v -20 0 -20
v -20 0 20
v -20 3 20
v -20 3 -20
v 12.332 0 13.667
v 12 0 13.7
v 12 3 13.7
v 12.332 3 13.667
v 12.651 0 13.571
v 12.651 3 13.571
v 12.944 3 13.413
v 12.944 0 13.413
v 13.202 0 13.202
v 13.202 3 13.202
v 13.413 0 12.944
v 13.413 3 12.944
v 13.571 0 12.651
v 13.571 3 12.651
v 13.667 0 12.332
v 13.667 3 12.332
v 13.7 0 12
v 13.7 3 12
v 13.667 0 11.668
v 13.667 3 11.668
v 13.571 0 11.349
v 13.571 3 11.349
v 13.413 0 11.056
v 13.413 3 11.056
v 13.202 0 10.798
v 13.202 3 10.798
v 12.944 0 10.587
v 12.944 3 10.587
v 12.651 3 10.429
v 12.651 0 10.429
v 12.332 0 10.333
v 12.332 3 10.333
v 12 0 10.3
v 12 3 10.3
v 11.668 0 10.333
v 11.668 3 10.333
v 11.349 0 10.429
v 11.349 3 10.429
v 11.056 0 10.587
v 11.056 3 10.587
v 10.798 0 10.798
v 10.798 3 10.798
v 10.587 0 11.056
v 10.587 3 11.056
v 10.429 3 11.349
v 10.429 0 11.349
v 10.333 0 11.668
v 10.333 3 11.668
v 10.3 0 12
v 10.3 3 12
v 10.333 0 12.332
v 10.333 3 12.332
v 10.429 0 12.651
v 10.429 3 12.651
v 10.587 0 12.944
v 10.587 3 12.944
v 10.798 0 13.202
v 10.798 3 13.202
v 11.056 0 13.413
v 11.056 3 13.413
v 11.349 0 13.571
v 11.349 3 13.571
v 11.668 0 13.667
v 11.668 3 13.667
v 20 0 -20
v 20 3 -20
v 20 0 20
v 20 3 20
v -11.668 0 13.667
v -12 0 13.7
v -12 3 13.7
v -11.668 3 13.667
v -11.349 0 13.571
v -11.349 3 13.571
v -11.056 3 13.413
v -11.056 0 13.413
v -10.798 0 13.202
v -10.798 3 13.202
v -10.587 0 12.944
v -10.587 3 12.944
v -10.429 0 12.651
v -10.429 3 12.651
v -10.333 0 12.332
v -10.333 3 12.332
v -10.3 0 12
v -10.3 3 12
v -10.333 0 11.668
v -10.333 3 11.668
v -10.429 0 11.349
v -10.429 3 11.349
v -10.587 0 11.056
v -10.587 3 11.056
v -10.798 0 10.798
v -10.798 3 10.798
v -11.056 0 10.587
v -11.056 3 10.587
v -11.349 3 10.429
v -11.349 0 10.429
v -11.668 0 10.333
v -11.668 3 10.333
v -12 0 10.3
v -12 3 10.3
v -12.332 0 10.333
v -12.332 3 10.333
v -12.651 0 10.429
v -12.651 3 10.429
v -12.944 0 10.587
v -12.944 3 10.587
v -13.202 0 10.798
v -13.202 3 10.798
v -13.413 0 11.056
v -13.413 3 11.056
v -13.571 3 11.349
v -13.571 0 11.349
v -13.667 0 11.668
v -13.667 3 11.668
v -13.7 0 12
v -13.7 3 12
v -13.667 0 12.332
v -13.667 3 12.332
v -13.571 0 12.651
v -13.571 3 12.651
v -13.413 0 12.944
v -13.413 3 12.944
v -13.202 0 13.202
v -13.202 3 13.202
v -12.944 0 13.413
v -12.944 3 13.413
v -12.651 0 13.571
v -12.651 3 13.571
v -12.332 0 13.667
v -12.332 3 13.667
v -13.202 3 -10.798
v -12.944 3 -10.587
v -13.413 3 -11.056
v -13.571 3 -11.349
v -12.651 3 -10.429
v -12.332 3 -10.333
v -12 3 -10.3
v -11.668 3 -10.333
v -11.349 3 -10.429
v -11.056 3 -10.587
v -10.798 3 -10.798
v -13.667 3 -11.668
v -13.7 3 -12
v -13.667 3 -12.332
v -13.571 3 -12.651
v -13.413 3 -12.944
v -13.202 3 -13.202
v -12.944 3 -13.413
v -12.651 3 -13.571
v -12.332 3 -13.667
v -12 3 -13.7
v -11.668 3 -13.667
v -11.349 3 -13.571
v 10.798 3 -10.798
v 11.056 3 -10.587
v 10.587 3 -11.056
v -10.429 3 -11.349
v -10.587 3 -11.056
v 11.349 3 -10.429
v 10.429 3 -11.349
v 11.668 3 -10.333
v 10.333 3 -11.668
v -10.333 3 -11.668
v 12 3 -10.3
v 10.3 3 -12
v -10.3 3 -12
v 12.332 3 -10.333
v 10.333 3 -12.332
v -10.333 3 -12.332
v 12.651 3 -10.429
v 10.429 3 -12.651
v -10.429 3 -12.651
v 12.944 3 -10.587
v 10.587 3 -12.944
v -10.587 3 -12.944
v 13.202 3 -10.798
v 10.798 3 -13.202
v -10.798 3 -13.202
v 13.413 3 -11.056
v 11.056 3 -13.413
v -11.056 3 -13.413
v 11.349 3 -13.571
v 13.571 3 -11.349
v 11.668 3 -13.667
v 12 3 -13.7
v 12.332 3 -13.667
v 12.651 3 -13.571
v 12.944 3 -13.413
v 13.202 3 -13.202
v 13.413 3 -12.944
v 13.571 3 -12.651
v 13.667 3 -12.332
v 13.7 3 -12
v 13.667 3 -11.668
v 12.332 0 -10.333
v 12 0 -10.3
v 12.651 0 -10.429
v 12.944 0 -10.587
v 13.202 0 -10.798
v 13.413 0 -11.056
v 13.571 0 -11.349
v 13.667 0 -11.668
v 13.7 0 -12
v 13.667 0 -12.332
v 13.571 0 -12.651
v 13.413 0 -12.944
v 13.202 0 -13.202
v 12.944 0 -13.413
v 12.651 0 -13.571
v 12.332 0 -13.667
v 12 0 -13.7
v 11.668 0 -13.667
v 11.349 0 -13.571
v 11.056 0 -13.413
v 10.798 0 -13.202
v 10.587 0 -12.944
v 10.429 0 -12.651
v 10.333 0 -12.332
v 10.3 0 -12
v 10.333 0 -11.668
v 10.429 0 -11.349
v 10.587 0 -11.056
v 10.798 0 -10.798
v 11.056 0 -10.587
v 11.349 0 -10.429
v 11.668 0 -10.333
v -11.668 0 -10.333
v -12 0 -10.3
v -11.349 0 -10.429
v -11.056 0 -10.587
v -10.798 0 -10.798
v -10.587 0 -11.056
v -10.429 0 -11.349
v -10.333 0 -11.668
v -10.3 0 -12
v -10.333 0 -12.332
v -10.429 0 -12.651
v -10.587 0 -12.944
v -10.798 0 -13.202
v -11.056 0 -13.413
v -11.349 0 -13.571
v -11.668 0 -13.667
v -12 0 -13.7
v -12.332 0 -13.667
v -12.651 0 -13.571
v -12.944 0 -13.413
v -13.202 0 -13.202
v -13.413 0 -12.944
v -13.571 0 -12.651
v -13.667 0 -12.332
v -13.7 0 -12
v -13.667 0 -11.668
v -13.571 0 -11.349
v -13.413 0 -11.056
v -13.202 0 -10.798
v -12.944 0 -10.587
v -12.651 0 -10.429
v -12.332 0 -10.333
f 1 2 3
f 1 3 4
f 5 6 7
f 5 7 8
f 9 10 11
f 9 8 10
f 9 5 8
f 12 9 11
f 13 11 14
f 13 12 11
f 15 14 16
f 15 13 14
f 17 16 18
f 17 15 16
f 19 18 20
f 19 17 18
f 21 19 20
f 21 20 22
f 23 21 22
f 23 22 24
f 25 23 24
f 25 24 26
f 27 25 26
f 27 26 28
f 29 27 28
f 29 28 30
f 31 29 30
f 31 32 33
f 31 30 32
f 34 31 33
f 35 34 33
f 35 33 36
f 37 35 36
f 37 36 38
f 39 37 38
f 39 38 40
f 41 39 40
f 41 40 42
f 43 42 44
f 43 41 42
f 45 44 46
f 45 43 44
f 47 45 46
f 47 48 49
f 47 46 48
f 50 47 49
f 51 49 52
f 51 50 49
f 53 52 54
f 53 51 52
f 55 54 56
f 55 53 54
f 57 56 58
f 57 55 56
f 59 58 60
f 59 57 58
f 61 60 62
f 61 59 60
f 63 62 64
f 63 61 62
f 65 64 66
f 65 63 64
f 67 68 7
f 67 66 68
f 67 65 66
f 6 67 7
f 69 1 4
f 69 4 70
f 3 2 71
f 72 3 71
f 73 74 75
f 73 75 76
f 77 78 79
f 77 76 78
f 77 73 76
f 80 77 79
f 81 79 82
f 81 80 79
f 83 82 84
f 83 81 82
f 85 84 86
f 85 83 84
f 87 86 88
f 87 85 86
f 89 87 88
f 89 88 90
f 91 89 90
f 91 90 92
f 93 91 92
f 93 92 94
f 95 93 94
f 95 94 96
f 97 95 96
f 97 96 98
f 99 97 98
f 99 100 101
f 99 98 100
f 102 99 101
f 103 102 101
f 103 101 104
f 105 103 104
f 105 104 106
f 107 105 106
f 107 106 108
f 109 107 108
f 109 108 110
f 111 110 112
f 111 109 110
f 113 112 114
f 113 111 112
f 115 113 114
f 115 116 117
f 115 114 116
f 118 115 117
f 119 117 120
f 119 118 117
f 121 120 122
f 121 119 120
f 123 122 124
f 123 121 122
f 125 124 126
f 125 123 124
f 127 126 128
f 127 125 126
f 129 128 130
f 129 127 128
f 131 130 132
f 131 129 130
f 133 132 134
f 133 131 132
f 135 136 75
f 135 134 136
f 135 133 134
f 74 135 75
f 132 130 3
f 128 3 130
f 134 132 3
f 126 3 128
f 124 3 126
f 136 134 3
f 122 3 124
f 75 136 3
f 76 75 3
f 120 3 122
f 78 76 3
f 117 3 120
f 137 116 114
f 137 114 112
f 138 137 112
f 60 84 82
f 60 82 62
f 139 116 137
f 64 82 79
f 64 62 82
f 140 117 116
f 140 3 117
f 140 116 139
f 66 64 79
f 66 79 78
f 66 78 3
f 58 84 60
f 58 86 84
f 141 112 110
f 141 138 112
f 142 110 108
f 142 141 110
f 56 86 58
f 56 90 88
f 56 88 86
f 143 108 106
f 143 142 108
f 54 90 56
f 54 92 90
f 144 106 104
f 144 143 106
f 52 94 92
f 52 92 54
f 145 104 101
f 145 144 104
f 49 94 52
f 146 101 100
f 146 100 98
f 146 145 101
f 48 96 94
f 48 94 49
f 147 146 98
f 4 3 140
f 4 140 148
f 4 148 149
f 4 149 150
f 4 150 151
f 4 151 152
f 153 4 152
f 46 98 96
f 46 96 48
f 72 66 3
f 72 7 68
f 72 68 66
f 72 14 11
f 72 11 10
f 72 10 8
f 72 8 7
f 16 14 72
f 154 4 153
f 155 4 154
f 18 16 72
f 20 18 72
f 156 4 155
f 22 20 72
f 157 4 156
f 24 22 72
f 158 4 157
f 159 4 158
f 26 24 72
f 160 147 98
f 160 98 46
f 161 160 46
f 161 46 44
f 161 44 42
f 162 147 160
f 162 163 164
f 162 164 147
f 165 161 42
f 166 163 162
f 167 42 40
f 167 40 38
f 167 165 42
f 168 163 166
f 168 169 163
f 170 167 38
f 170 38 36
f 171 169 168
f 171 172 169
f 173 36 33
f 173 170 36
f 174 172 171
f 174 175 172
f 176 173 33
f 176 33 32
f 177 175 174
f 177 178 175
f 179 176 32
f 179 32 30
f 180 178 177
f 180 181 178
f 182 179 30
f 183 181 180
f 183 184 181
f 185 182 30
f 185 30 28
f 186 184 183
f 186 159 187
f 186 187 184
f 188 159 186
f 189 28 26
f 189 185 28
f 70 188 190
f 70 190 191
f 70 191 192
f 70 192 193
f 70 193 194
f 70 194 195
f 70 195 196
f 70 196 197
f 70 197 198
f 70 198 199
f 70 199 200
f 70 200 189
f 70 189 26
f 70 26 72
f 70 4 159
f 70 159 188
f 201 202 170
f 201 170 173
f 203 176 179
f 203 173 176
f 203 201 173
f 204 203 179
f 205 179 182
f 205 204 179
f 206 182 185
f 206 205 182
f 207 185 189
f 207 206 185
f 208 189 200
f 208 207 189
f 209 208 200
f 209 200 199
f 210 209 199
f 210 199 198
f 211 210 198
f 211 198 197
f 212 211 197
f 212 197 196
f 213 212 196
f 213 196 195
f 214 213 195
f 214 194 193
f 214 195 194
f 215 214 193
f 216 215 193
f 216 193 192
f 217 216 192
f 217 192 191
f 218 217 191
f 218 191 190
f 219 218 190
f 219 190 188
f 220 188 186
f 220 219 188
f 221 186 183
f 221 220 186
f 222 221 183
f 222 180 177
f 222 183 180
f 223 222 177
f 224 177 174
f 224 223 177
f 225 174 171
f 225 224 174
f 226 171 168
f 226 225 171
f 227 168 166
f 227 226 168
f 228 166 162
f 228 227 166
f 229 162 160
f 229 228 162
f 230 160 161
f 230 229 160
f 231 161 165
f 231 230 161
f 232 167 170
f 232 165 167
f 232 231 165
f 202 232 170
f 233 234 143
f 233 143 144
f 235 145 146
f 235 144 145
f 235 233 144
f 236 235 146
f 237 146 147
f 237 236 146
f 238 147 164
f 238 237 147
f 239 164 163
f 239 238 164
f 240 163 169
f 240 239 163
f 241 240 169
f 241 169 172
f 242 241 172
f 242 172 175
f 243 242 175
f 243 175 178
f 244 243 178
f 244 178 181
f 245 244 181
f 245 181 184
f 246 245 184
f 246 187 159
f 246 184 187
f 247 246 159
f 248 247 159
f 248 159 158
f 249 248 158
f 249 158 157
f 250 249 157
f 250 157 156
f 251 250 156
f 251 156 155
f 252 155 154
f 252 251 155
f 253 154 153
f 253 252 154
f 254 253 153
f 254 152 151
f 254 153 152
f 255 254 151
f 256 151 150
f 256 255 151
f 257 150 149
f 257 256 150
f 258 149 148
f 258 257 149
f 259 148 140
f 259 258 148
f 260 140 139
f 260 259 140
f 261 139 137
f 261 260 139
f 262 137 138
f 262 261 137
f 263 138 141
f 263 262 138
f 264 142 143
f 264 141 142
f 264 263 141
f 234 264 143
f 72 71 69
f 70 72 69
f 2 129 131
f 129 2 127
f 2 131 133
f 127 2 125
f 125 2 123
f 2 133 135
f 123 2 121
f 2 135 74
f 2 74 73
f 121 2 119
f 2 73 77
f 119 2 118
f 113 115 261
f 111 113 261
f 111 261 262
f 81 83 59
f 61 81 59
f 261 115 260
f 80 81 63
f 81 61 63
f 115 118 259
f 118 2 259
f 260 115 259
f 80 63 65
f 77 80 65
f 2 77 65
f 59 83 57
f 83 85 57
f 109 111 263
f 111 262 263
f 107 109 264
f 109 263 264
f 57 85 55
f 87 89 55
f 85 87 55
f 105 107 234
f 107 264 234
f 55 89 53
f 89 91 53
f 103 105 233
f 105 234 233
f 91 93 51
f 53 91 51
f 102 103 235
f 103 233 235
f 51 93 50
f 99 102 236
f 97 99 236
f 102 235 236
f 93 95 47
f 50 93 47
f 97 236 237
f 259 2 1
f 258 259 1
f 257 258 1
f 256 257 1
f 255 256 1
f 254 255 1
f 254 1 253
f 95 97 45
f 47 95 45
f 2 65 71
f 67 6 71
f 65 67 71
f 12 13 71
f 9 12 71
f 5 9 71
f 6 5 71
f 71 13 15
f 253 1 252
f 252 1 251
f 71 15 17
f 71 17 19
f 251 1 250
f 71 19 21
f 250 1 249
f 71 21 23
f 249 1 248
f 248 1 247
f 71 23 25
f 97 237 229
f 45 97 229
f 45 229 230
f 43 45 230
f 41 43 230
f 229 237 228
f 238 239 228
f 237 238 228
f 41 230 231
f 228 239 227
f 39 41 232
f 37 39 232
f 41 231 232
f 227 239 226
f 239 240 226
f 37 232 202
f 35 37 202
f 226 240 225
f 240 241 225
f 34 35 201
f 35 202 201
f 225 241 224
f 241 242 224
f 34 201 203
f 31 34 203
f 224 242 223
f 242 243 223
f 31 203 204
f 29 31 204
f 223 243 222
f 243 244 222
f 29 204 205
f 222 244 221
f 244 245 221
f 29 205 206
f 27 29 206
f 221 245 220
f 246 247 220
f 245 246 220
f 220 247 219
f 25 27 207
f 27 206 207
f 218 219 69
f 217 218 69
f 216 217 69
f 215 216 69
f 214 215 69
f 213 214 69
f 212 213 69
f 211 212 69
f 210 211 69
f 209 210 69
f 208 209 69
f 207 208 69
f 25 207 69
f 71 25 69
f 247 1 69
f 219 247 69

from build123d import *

# Parameters (mm, degrees)
SKETCH1_W             = 40
SKETCH1_H             = 40
CROSS_JOINER_DEPTH    = 3
BOLT_HOLES_DEPTH      = 29.442925307
BOLT_HOLES_DEPTH_BACK = 29.442925307
SKETCH2_R             = 1.7


with BuildPart() as part:
    # Sketch1 → Cross Joiner (new body)
    with BuildSketch(Plane(origin=(0, 0, 0), x_dir=(1, 0, 0), z_dir=(0, 1, 0))):
        Rectangle(SKETCH1_W, SKETCH1_H)
    extrude(amount=CROSS_JOINER_DEPTH)

    # Sketch2 → Bolt Holes (cut, two sides: drawn at the far end of the back side and taken through both)
    with BuildSketch(Plane(origin=(0, 0, 0), x_dir=(1, 0, 0), z_dir=(0, 1, 0)).offset(-BOLT_HOLES_DEPTH_BACK)):
        with Locations(Location((-12, -12, 0), (0, 0, 270))):
            Circle(SKETCH2_R)
        with Locations(Location((-12, 12, 0), (0, 0, 270))):
            Circle(SKETCH2_R)
        with Locations(Location((12, -12, 0), (0, 0, 270))):
            Circle(SKETCH2_R)
        with Locations(Location((12, 12, 0), (0, 0, 270))):
            Circle(SKETCH2_R)
    extrude(amount=BOLT_HOLES_DEPTH + BOLT_HOLES_DEPTH_BACK, mode=Mode.SUBTRACT)


solid = part.part
